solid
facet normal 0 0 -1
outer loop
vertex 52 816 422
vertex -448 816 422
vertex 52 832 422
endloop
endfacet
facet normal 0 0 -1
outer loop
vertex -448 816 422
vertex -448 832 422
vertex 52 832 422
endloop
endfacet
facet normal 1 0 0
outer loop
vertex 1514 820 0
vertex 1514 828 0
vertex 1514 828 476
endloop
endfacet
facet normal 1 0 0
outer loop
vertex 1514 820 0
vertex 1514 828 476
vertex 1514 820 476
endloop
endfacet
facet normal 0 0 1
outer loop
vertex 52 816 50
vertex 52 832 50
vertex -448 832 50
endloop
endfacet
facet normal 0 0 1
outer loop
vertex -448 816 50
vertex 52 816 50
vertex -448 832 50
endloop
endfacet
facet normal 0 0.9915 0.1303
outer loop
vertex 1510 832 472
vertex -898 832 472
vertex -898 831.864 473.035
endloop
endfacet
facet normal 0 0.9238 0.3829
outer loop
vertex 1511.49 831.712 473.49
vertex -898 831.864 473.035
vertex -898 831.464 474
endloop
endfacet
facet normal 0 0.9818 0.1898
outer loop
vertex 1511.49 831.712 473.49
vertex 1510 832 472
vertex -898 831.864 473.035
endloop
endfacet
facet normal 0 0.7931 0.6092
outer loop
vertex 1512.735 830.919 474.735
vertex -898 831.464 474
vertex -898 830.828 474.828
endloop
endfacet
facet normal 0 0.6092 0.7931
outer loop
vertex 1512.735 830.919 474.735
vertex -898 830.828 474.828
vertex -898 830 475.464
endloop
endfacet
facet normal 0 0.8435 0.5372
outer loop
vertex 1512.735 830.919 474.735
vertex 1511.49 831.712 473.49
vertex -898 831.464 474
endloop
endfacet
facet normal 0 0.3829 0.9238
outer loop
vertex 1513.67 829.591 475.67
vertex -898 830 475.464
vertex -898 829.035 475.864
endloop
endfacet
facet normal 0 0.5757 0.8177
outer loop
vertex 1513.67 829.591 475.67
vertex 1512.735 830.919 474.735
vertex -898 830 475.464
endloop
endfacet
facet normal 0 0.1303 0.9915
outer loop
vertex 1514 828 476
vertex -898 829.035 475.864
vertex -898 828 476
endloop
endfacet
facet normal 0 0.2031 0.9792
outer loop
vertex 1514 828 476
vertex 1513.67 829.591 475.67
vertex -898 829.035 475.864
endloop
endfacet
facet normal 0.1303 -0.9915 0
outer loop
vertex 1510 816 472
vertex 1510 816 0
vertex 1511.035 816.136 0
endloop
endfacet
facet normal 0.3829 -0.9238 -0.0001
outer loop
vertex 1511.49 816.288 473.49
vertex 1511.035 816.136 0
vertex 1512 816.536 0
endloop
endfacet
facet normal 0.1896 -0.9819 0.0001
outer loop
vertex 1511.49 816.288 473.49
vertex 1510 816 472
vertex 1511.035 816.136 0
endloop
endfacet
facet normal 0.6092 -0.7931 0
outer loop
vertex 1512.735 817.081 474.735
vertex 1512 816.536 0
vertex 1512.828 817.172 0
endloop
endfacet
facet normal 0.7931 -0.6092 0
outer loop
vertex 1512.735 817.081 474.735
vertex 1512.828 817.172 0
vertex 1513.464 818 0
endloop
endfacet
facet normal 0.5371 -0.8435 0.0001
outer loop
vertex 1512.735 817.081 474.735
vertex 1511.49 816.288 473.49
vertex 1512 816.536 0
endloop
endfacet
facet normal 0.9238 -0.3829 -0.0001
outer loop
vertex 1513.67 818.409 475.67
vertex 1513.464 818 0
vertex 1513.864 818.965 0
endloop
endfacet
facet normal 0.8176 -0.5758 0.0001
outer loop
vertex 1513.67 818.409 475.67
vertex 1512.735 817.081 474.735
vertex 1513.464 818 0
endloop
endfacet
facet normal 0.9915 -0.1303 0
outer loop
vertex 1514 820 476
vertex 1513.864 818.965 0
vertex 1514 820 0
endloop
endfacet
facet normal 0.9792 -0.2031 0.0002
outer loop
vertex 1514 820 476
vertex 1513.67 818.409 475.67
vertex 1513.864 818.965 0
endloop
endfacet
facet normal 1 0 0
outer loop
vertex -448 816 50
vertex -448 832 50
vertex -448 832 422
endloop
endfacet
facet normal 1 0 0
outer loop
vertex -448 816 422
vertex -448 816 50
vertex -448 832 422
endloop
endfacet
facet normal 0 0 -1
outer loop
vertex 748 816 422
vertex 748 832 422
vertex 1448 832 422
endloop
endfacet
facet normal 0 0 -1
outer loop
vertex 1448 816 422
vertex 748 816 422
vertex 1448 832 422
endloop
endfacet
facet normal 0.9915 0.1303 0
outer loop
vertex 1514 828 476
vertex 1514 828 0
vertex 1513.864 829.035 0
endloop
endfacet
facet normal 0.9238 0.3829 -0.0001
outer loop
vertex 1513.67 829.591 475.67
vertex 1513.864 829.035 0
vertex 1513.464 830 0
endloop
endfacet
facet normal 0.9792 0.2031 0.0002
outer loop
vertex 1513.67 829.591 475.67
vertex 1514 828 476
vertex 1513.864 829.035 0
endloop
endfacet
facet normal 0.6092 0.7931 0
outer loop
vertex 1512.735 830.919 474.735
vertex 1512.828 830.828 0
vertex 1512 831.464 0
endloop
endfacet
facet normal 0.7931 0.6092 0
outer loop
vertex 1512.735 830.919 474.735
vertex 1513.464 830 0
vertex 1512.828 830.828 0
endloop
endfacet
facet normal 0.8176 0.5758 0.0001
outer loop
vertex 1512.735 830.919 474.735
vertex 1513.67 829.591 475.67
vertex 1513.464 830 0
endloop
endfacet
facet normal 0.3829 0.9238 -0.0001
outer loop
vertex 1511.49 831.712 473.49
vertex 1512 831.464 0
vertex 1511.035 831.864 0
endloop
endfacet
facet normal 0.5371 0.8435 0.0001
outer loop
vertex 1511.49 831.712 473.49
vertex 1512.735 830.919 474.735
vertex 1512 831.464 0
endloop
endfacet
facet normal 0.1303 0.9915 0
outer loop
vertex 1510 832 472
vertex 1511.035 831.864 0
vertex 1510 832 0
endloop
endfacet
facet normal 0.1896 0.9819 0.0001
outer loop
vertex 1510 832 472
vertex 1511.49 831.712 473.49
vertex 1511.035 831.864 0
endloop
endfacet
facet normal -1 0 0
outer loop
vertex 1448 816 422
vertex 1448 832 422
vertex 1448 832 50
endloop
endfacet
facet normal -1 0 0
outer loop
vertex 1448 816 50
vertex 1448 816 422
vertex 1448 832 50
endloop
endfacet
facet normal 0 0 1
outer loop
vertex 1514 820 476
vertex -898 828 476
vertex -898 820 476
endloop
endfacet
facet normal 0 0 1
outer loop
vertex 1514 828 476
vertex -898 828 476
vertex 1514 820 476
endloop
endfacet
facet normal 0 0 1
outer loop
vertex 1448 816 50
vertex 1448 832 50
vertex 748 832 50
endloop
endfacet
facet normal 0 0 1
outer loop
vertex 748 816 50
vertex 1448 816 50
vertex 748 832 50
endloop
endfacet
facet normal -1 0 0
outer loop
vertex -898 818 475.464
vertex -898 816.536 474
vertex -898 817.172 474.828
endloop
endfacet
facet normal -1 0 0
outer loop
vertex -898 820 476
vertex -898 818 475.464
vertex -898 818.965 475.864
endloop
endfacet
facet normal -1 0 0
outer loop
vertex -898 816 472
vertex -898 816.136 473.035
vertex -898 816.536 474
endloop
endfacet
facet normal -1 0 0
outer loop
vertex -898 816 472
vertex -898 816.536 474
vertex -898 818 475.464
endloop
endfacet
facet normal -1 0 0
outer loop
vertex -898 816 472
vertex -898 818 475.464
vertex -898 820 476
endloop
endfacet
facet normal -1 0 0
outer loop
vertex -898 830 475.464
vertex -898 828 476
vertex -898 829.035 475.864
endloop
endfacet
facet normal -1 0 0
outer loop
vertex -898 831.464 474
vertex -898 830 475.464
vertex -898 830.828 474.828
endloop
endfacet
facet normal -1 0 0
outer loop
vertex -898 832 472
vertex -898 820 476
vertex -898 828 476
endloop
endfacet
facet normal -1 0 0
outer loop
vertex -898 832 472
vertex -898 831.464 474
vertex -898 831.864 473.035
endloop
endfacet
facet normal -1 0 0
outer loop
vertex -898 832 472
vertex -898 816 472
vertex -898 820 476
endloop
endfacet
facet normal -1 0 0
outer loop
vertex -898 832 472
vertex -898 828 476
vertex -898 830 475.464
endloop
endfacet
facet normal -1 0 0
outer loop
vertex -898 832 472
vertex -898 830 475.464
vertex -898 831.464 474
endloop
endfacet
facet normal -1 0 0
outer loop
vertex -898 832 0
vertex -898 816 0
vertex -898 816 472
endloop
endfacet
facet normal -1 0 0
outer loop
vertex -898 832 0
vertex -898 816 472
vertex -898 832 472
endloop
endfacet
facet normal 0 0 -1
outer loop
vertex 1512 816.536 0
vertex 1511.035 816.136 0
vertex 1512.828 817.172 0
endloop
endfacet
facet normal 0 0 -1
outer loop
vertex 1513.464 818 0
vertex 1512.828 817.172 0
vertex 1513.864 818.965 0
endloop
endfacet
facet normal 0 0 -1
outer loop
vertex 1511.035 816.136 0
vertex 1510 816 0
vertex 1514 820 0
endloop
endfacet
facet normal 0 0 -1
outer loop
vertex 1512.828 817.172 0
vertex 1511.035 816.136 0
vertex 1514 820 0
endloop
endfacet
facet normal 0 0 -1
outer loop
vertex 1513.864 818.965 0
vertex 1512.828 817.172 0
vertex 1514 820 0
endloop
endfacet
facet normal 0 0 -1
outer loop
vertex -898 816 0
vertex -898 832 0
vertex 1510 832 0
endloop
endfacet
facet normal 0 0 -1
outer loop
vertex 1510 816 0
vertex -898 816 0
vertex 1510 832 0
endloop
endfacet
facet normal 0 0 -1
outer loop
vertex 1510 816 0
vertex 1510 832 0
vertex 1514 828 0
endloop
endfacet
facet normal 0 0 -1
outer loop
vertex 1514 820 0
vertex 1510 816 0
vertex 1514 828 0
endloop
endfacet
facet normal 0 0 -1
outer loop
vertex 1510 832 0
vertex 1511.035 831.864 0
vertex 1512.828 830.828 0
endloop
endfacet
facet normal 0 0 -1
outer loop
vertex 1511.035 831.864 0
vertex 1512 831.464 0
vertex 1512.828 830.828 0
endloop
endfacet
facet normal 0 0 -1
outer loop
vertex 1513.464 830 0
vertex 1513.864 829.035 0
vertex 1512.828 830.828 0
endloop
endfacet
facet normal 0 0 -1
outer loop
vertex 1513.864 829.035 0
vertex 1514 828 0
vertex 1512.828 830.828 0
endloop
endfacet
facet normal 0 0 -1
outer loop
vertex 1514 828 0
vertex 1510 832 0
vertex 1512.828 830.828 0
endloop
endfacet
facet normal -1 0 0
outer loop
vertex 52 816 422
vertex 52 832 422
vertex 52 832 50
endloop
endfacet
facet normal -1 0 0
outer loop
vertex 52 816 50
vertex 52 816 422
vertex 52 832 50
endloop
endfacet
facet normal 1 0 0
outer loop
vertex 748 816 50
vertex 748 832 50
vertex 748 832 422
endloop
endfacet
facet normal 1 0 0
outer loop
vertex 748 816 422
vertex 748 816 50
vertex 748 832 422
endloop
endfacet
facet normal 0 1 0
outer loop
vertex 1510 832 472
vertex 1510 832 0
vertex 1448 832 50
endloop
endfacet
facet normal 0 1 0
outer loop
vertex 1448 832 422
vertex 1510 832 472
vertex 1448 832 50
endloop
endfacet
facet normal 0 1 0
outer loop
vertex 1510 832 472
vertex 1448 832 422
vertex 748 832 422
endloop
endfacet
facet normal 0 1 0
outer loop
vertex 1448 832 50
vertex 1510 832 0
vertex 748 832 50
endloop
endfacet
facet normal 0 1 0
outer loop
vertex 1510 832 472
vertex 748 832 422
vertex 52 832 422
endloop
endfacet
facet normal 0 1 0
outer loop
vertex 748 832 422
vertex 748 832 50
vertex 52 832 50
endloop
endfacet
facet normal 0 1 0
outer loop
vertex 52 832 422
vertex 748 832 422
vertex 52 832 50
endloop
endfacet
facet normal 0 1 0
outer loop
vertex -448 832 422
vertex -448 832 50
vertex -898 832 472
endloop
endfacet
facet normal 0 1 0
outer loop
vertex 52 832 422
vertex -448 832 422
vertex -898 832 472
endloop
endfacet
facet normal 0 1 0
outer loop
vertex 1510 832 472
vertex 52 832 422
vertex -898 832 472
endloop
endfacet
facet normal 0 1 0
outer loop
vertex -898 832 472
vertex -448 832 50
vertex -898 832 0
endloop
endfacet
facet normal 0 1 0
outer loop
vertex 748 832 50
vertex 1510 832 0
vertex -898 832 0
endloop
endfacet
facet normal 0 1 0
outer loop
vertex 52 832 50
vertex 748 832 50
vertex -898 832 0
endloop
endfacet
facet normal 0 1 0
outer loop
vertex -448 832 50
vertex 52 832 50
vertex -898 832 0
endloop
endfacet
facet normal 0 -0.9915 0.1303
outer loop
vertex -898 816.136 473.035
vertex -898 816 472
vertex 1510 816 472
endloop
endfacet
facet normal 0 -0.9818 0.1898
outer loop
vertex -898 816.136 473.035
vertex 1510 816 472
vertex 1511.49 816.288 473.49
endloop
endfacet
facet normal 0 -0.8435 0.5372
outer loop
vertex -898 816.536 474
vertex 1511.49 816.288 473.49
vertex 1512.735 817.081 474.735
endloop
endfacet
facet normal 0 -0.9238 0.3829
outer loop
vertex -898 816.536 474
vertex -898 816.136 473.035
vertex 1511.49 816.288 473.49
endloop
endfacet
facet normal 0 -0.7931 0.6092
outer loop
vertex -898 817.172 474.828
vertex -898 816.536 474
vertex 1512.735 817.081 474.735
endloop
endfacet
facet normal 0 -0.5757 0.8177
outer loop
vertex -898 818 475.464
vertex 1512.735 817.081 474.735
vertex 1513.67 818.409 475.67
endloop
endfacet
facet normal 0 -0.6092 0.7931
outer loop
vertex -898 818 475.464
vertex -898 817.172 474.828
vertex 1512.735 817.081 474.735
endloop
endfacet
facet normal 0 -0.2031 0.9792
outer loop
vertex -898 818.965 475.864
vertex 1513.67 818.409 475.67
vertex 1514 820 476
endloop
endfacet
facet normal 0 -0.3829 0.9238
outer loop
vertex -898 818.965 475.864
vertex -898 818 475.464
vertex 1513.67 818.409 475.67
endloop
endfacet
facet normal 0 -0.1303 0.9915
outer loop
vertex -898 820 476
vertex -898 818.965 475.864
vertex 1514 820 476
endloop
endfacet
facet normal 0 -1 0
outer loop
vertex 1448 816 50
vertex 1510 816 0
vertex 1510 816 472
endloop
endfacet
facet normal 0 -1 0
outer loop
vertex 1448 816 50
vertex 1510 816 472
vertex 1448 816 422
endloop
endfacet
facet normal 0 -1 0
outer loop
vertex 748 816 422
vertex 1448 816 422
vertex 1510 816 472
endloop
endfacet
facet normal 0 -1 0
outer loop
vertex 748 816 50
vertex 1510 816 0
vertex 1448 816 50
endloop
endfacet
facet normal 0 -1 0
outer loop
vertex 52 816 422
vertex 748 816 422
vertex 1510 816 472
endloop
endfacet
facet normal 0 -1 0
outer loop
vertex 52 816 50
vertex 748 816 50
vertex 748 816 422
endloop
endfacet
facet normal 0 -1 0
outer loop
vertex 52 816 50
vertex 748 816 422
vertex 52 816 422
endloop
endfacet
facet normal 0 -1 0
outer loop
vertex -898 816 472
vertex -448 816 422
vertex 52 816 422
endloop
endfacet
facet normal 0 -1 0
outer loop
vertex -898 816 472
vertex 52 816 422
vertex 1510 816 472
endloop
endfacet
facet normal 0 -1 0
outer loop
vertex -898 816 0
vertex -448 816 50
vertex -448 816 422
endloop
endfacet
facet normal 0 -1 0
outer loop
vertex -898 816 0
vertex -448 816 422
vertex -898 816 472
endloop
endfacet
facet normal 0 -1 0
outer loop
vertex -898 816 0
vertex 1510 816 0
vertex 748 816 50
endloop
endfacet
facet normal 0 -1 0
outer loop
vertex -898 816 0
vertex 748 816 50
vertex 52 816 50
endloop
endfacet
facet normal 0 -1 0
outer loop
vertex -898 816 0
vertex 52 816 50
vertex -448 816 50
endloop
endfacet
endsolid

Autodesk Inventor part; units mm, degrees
ref_plane "YZ Plane" through (0, 0, 0) normal (1, 0, 0) x (0, 1, 0)
ref_plane "XZ Plane" through (0, 0, 0) normal (0, 1, 0) x (-1, 0, 0)
ref_plane "XY Plane" through (0, 0, 0) normal (0, 0, 1) x (1, 0, 0)
sketch "Sketch1" plane through (0, 0, 0) normal (0, 0, 1) x (1, 0, 0)
  line L0 (-1498, 0) -> (1498, 0) construction
  line L1 (-1498, 0) -> (-898, 0)
  line L2 (-898, 0) -> (-898, 2068)
  line L3 (-898, 2068) -> (-1498, 2068)
  line L4 (-1498, 2068) -> (-1498, 0)
  line L5 (-898, 0) -> (-498, 0)
  line L6 (-498, 0) -> (-498, 816)
  line L7 (-498, 816) -> (-898, 816)
  line L8 (-898, 816) -> (-898, 0)
  line L9 (-498, 0) -> (102, 0)
  line L10 (102, 0) -> (102, 816)
  line L11 (102, 816) -> (-498, 816)
  line L12 (-498, 816) -> (-498, 0)
  line L13 (102, 0) -> (698, 0)
  line L14 (698, 0) -> (698, 668)
  line L15 (698, 668) -> (102, 668)
  line L16 (102, 668) -> (102, 0)
  line L17 (698, 0) -> (1498, 0)
  line L18 (1498, 0) -> (1498, 816)
  line L19 (1498, 816) -> (698, 816)
  line L20 (698, 816) -> (698, 0)
  line L21 (-1498, 0) -> (1498, 0)
  line L22 (1498, 0) -> (1498, 96)
  line L23 (1498, 96) -> (-1498, 96)
  line L24 (-1498, 96) -> (-1498, 0)
  line L25 (-898, 816) -> (1498, 816)
  line L26 (1498, 816) -> (1498, 832)
  line L27 (1498, 832) -> (-898, 832)
  line L28 (-898, 832) -> (-898, 816)
  line L29 (-898, 1972) -> (-498, 1972)
  line L30 (-498, 1972) -> (-498, 1372)
  line L31 (-498, 1372) -> (-898, 1372)
  line L32 (-898, 1372) -> (-898, 1972)
  line L33 (698, 1972) -> (1498, 1972)
  line L34 (1498, 1972) -> (1498, 1372)
  line L35 (1498, 1372) -> (698, 1372)
  line L36 (698, 1372) -> (698, 1972)
  line L37 (698, 1372) -> (98, 1372)
  line L38 (98, 1372) -> (98, 1972)
  line L39 (98, 1972) -> (698, 1972)
  line L40 (698, 1972) -> (698, 1372)
  line L41 (-498, 1372) -> (98, 1372)
  line L42 (-498, 1372) -> (-275, 1637.7611)
  line L43 (98, 1372) -> (-125, 1637.7611)
  line L44 (-275, 1637.7611) -> (-125, 1637.7611)
  line L45 (-125, 1637.7611) -> (-125, 2068)
  line L46 (-125, 2068) -> (-275, 2068)
  line L47 (-275, 2068) -> (-275, 1637.7611)
  line L48 (1098, 816) -> (1098, 96)
  line L49 (-198, 816) -> (-198, 96)
  line L50 (-898, 668) -> (-498, 668)
  line L51 (-1498, 520) -> (-898, 520)
  line L52 (-1498, 1579) -> (-898, 1579)
  line L53 (398, 1972) -> (398, 1372)
  line L54 (1098, 1972) -> (1098, 1372)
  line L55 (698, 1876) -> (1498, 1876)
  line L56 (698, 1468) -> (1498, 1468)
  line L57 (-1498, 1049.5) -> (-898, 1049.5)
  line L58 (1498, 832) -> (1514, 832)
  line L59 (1514, 832) -> (1514, 816)
  line L60 (1514, 816) -> (1498, 816)
  line L61 (1498, 816) -> (1498, 832)
  point P0 (0, 0)
  point P1 (0, 0)
  point P2 (0, 0)
  point P3 (-198, 816)
  point P4 (0, 0)
  dimension "d0" = 2996
  dimension "d1" = 600
  dimension "d2" = 2068
  dimension "d3" = 400
  dimension "d4" = 816
  dimension "d5" = 600
  dimension "d6" = 816
  dimension "d7" = 596
  dimension "d8" = 668
  dimension "d9" = 800
  dimension "d10" = 816
  dimension "d11" = 96
  dimension "d12" = 16
  dimension "d13" = 400
  dimension "d14" = 600
  dimension "d15" = 96
  dimension "d16" = 800
  dimension "d17" = 600
  dimension "d18" = 600
  dimension "d19" = 600
  dimension "d20" = 50
  dimension "d21" = 150
  dimension "d22" = 148
  dimension "d23" = 1059
  dimension "d24" = 96
  dimension "d25" = 96
  dimension "d26" = 529.5
  dimension "d27" = 16
extrude "Extrusion1" add sketch "Sketch1" along normal blind 476 contours L2 L27 L26 L19 L25 L11 L7 | L58 L59 L60 L26
fillet "Fillet1" radius 4 4 edges at (300, 832, 476) (-698, 816, 476) (1514, 832, 238) (1514, 816, 238)
sketch "Sketch2" plane through (-898, 832, 0) normal (0, 1, 0) x (1, 0, 0)
  line L0 (2408, -472) -> (0, -472) projected
  line L1 (400, 0) -> (1000, 0)
  line L2 (1000, 0) -> (1000, -472)
  line L3 (1000, -472) -> (400, -472)
  line L4 (400, -472) -> (400, 0)
  line L5 (1596, 0) -> (2396, 0)
  line L6 (2396, 0) -> (2396, -472)
  line L7 (2396, -472) -> (1596, -472)
  line L8 (1596, -472) -> (1596, 0)
  line L9 (950, -422) -> (950, -50)
  line L10 (950, -50) -> (450, -50)
  line L11 (450, -50) -> (450, -422)
  line L12 (450, -422) -> (950, -422)
  line L13 (2346, -50) -> (1646, -50)
  line L14 (1646, -50) -> (1646, -422)
  line L15 (1646, -422) -> (2346, -422)
  line L16 (2346, -422) -> (2346, -50)
  point P0 (898, 0)
  point P1 (400, 0)
  point P2 (1000, 0)
  point P3 (1596, 0)
  point P4 (2396, 0)
  dimension "d31" = 50
  dimension "d32" = 50
extrude "Extrusion2" cut sketch "Sketch2" against normal blind 20 contours L12 L11 L10 L9 | L16 L15 L14 L13
properties part number "Countertop"
